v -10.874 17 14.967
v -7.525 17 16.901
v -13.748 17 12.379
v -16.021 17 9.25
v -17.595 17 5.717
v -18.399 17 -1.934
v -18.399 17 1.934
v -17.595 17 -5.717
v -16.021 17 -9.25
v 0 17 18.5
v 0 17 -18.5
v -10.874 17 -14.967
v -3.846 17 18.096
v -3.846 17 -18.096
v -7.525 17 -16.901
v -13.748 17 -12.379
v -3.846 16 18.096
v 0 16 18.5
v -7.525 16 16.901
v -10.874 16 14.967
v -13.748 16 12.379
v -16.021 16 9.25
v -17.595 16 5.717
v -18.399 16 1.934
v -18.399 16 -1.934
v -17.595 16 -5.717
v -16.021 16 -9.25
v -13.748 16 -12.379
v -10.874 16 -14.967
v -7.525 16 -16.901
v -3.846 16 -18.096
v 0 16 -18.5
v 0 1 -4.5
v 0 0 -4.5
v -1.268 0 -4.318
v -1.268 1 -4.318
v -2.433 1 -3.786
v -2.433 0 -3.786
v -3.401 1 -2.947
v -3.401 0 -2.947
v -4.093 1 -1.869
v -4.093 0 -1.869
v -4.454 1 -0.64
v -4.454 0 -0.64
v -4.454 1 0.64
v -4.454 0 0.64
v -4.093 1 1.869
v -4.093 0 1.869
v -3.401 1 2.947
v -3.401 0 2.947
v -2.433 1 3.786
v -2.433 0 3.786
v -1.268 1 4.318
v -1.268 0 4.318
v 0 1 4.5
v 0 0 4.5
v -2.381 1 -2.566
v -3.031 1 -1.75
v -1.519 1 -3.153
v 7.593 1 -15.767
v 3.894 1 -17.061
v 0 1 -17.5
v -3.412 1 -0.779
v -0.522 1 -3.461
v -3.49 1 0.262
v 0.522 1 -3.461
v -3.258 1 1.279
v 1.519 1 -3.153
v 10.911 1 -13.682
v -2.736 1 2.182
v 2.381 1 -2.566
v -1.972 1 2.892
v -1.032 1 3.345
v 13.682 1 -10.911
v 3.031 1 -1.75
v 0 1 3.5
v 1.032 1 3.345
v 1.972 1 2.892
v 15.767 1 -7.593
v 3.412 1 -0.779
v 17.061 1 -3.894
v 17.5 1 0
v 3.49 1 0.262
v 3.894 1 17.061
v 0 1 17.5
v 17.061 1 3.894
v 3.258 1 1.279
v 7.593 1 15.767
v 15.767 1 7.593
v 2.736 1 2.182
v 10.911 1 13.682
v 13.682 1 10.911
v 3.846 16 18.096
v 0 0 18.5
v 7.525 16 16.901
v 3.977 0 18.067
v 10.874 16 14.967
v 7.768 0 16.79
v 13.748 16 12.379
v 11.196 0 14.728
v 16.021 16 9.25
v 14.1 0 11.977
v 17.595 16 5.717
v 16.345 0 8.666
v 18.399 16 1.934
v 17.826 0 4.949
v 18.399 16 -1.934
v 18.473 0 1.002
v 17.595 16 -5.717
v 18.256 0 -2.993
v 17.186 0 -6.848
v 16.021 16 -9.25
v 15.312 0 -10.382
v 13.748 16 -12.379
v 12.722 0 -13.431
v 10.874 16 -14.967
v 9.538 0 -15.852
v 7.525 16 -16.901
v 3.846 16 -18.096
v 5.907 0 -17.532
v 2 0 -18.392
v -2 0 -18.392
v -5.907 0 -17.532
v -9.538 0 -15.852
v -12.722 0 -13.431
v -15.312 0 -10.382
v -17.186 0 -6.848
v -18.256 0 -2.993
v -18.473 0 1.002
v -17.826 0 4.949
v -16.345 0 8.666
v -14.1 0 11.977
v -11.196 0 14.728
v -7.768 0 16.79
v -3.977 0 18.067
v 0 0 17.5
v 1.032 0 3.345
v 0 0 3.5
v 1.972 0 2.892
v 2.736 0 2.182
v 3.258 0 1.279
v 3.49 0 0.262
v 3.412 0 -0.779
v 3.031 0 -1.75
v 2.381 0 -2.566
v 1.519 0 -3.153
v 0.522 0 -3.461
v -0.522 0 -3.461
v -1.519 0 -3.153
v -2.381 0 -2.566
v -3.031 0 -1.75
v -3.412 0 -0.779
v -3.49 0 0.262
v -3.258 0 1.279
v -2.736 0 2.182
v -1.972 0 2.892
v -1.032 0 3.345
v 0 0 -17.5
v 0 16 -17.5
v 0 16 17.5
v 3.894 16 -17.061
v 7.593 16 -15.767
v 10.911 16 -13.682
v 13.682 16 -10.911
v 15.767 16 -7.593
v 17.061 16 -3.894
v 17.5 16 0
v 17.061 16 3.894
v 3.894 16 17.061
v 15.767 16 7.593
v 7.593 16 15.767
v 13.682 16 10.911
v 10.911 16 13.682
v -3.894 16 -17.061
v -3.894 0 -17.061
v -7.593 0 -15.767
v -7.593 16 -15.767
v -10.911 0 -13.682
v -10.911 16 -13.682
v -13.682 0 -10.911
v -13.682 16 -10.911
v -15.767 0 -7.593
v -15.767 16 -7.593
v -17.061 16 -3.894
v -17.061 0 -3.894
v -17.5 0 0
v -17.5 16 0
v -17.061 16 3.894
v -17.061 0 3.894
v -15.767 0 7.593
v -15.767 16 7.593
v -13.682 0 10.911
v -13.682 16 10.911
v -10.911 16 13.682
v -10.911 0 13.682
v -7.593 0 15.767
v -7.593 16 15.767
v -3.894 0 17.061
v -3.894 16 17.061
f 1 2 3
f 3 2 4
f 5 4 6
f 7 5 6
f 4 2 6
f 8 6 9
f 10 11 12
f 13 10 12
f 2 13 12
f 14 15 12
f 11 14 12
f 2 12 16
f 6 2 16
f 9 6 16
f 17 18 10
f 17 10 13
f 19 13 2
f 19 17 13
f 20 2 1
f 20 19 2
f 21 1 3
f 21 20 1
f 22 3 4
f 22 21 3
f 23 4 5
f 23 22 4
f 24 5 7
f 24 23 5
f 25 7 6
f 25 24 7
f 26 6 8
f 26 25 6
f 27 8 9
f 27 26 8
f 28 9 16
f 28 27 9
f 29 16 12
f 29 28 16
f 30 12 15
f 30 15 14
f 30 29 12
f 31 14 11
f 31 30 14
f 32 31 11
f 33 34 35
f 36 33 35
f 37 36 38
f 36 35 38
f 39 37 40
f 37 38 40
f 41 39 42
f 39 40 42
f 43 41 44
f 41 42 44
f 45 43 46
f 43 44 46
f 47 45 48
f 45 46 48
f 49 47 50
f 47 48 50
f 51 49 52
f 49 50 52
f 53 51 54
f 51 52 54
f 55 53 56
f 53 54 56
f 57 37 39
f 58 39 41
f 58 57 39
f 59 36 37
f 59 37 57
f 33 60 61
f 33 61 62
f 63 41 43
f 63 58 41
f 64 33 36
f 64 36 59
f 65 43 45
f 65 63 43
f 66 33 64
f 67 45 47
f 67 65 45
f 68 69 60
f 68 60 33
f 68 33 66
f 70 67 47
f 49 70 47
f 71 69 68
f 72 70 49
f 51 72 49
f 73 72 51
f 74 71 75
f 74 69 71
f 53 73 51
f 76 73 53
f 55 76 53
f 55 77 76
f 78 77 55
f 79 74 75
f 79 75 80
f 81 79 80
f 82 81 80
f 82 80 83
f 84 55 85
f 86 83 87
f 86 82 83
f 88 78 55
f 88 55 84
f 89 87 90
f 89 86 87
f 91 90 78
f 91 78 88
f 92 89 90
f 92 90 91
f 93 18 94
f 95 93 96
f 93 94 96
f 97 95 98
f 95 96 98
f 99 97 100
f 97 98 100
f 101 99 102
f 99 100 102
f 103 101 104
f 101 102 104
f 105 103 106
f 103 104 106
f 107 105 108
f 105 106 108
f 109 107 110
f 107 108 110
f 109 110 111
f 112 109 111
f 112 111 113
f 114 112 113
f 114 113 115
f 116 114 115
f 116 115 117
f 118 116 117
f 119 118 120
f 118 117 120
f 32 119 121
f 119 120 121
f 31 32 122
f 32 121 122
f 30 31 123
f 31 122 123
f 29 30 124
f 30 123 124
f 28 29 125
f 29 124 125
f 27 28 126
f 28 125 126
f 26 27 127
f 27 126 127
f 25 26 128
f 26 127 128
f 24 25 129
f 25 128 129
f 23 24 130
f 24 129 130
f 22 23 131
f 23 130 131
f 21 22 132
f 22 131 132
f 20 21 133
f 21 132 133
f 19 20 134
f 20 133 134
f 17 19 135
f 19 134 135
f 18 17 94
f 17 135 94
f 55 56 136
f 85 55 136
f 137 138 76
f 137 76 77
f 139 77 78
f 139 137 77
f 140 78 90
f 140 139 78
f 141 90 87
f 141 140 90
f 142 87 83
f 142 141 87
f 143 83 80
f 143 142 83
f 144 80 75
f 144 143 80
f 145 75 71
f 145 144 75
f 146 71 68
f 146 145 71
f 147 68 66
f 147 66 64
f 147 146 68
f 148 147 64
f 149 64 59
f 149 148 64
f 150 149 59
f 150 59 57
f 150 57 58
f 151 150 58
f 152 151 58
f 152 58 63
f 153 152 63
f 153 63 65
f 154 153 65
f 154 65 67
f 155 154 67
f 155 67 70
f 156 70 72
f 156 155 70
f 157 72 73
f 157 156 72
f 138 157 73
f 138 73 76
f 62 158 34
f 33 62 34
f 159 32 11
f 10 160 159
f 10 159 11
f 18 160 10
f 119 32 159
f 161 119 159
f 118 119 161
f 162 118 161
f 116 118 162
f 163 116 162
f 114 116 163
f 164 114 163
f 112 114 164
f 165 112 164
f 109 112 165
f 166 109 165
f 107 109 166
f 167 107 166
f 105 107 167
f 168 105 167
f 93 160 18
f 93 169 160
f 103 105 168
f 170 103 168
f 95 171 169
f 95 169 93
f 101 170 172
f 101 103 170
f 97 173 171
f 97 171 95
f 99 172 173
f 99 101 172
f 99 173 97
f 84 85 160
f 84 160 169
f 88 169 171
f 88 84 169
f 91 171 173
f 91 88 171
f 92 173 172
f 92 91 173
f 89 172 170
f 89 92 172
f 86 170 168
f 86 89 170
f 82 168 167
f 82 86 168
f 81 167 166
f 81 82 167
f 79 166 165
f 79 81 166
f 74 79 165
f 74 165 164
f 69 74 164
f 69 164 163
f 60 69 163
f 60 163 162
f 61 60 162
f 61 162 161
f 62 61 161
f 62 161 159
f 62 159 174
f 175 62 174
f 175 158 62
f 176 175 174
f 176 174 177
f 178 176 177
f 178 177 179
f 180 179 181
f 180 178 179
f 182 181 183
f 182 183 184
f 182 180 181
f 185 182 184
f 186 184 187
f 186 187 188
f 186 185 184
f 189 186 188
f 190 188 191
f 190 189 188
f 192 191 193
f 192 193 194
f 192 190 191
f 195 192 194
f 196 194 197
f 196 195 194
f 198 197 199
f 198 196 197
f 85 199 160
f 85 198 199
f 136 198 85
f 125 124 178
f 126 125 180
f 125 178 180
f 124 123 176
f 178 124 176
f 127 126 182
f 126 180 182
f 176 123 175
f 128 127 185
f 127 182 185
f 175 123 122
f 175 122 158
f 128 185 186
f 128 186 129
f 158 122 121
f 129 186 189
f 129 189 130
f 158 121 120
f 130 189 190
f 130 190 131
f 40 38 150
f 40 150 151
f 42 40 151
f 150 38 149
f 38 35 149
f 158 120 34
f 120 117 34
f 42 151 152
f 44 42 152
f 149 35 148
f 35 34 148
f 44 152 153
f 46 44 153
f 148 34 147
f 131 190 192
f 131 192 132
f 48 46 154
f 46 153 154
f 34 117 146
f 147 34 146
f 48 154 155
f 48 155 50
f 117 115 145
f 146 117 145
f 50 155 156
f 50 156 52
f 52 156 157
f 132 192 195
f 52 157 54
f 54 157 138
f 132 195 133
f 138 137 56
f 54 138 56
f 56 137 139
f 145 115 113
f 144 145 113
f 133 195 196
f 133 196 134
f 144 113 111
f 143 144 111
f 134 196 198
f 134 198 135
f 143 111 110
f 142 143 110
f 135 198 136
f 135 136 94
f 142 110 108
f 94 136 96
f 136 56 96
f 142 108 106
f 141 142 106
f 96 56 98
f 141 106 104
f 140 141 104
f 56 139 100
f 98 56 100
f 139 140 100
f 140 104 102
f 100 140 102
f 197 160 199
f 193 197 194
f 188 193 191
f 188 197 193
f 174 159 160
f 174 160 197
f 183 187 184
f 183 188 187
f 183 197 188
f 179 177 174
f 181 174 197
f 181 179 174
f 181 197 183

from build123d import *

# Parameters (mm, degrees)
SKETCH1_R           = 18.5
SKETCH1_R_2         = 17.5
SKETCH1_R_3         = 4.5
SKETCH1_R_4         = 3.5
BOSS_EXTRUDE1_DEPTH = 1
SKETCH2_R           = 18.5
SKETCH2_R_2         = 17.5
BOSS_EXTRUDE2_DEPTH = 15
BOSS_EXTRUDE3_DEPTH = 1


with BuildPart() as part:
    # Sketch1 → Boss-Extrude1 (new body)
    with BuildSketch(Plane(origin=(0, 0, 0), x_dir=(1, 0, 0), z_dir=(0, 1, 0))):
        with Locations(Location((0, 0, 0), (0, 0, 270))):
            Circle(SKETCH1_R)
        Circle(SKETCH1_R_2, mode=Mode.SUBTRACT)
        Circle(SKETCH1_R_3)
        with Locations(Location((0, 0, 0), (0, 0, 270))):
            Circle(SKETCH1_R_4, mode=Mode.SUBTRACT)
        with BuildLine():
            Line((0, 17.5), (0, 4.5))
            ThreePointArc((0, 4.5), (3.181980515, 3.181980515), (4.5, 0))
            ThreePointArc((4.5, 0), (3.181980515, -3.181980515), (0, -4.5))
            Line((0, -4.5), (0, -17.5))
            ThreePointArc((0, -17.5), (12.374368671, -12.374368671), (17.5, 0))
            ThreePointArc((17.5, 0), (12.374368671, 12.374368671), (0, 17.5))
        make_face()
    extrude(amount=BOSS_EXTRUDE1_DEPTH)

    # Sketch2 → Boss-Extrude2 (add)
    with BuildSketch(Plane(origin=(0, 1, 0), x_dir=(1, 0, 0), z_dir=(0, 1, 0))):
        with Locations(Location((0, 0, 0), (0, 0, 270))):
            Circle(SKETCH2_R)
        with Locations(Location((0, 0, 0), (0, 0, 270))):
            Circle(SKETCH2_R_2, mode=Mode.SUBTRACT)
    extrude(amount=BOSS_EXTRUDE2_DEPTH)

    # Sketch3 → Boss-Extrude3 (add)
    with BuildSketch(Plane(origin=(0, 16, 0), x_dir=(1, 0, 0), z_dir=(0, 1, 0))):
        with BuildLine():
            Line((0, 18.5), (0, -18.5))
            ThreePointArc((0, -18.5), (-18.5, 0), (0, 18.5))
        make_face()
    extrude(amount=BOSS_EXTRUDE3_DEPTH)


solid = part.part
